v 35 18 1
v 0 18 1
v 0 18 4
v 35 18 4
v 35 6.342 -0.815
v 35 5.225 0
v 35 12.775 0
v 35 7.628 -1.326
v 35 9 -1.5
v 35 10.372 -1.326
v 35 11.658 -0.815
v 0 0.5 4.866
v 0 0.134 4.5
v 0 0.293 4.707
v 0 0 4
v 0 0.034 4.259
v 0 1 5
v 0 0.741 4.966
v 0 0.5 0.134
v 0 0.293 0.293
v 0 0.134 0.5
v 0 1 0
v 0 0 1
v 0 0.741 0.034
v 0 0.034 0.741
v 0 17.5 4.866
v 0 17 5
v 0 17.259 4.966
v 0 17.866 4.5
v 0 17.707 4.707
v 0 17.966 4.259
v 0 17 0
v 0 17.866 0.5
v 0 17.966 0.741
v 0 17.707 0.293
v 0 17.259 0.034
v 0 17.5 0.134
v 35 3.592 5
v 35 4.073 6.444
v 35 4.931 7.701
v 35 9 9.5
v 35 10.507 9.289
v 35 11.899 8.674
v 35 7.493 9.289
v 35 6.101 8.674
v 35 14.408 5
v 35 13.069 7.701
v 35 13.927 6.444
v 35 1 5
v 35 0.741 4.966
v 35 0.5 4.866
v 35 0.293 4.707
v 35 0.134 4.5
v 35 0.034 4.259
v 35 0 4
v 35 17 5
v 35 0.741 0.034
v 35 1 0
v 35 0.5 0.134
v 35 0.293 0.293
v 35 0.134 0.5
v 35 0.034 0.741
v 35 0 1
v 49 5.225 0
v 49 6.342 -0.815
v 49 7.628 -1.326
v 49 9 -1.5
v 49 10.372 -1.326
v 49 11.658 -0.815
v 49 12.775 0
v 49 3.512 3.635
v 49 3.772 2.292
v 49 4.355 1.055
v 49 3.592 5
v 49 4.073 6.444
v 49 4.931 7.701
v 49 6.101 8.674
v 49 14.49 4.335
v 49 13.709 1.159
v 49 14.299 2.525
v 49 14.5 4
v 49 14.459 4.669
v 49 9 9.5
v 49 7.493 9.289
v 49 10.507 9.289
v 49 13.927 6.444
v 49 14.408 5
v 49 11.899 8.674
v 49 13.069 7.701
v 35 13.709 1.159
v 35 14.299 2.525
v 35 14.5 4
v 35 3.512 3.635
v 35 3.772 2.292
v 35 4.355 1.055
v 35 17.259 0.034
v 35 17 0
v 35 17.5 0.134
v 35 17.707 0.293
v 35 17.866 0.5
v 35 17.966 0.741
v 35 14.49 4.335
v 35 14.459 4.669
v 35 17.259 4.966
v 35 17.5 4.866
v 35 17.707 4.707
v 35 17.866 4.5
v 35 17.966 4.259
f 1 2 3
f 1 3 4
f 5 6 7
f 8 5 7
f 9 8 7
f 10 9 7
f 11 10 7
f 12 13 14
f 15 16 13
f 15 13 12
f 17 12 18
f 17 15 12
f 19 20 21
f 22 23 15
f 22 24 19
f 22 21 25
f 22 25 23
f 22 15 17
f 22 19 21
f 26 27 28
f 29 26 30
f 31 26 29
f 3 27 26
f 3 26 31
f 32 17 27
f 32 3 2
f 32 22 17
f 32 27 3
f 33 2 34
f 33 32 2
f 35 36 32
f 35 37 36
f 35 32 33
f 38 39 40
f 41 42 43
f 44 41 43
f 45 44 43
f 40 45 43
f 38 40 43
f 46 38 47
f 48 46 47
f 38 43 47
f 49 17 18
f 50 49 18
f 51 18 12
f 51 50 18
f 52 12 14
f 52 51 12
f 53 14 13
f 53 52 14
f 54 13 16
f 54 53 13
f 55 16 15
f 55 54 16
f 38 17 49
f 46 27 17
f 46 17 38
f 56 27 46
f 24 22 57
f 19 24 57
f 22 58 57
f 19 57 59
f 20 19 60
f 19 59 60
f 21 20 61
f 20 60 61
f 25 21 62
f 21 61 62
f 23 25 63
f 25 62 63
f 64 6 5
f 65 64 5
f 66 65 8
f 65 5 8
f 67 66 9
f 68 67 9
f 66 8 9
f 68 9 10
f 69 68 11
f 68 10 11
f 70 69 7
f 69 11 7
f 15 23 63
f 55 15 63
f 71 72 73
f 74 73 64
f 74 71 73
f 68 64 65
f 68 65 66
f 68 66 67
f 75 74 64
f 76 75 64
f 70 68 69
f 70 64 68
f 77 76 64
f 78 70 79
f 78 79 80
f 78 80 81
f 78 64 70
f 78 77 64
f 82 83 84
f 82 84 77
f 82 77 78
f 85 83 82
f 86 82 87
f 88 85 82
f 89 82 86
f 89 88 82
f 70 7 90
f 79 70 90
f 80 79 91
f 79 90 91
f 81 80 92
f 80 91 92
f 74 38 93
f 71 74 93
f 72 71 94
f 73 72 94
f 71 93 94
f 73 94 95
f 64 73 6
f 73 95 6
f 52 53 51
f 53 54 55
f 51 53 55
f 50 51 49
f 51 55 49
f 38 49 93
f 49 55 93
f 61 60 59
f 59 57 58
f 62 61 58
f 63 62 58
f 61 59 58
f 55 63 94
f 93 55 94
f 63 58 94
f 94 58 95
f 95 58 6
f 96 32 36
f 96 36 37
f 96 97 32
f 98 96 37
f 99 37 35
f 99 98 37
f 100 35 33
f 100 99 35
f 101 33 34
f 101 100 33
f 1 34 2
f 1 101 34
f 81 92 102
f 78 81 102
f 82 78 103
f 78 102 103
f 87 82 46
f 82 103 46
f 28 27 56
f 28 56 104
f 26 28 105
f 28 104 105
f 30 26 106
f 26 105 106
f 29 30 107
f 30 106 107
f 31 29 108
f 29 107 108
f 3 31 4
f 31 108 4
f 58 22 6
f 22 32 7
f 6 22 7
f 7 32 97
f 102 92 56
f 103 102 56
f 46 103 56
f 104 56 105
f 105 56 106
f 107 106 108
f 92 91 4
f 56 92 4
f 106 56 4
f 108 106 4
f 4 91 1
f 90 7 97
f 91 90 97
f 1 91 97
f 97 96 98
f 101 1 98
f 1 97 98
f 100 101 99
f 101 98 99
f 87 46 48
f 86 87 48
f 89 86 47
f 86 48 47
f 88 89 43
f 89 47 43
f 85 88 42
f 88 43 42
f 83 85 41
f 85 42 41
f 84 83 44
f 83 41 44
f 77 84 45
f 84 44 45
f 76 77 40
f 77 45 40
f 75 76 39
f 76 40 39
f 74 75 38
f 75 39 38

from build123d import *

# Parameters (mm, degrees)
F0_W     = 35
F0_H     = 18
F1_DEPTH = 5
F3_DEPTH = 14
F4_R     = 1


with BuildPart() as f1:
    # F0 (on Top) → F1 (new body)
    with BuildSketch(Plane.XY):
        with Locations((17.5, 9)):
            Rectangle(F0_W, F0_H)
    extrude(amount=F1_DEPTH)

    # F2 (on face) → F3 (join)
    with BuildSketch(Plane.YZ.offset(35)):
        with BuildLine():
            Line((3.5916730868, 5), (14.4083269132, 5))
            ThreePointArc((14.4083269132, 5), (9, 9.5), (3.5916730868, 5))
        make_face()
        with BuildLine():
            ThreePointArc((12.7749172176, 0), (14.0503487353, 1.8219325879), (14.5, 4))
            ThreePointArc((14.5, 4), (14.4770337785, 4.502096593), (14.4083269132, 5))
            Line((14.4083269132, 5), (3.5916730868, 5))
            ThreePointArc((3.5916730868, 5), (3.7719034829, 2.2920752919), (5.2250827824, 0))
            Line((5.2250827824, 0), (12.7749172176, 0))
        make_face()
        with BuildLine():
            ThreePointArc((5.2250827824, 0), (9, -1.5), (12.7749172176, 0))
            Line((12.7749172176, 0), (5.2250827824, 0))
        make_face()
    extrude(amount=F3_DEPTH)

    # F4
    f4_edges = [f1.edges().sort_by_distance(p)[0] for p in [
        (17.5, 0, 5),
        (17.5, 18, 5),
        (17.5, 0, 0),
        (17.5, 18, 0),
    ]]
    fillet(f4_edges, radius=F4_R)


solid = f1.part
